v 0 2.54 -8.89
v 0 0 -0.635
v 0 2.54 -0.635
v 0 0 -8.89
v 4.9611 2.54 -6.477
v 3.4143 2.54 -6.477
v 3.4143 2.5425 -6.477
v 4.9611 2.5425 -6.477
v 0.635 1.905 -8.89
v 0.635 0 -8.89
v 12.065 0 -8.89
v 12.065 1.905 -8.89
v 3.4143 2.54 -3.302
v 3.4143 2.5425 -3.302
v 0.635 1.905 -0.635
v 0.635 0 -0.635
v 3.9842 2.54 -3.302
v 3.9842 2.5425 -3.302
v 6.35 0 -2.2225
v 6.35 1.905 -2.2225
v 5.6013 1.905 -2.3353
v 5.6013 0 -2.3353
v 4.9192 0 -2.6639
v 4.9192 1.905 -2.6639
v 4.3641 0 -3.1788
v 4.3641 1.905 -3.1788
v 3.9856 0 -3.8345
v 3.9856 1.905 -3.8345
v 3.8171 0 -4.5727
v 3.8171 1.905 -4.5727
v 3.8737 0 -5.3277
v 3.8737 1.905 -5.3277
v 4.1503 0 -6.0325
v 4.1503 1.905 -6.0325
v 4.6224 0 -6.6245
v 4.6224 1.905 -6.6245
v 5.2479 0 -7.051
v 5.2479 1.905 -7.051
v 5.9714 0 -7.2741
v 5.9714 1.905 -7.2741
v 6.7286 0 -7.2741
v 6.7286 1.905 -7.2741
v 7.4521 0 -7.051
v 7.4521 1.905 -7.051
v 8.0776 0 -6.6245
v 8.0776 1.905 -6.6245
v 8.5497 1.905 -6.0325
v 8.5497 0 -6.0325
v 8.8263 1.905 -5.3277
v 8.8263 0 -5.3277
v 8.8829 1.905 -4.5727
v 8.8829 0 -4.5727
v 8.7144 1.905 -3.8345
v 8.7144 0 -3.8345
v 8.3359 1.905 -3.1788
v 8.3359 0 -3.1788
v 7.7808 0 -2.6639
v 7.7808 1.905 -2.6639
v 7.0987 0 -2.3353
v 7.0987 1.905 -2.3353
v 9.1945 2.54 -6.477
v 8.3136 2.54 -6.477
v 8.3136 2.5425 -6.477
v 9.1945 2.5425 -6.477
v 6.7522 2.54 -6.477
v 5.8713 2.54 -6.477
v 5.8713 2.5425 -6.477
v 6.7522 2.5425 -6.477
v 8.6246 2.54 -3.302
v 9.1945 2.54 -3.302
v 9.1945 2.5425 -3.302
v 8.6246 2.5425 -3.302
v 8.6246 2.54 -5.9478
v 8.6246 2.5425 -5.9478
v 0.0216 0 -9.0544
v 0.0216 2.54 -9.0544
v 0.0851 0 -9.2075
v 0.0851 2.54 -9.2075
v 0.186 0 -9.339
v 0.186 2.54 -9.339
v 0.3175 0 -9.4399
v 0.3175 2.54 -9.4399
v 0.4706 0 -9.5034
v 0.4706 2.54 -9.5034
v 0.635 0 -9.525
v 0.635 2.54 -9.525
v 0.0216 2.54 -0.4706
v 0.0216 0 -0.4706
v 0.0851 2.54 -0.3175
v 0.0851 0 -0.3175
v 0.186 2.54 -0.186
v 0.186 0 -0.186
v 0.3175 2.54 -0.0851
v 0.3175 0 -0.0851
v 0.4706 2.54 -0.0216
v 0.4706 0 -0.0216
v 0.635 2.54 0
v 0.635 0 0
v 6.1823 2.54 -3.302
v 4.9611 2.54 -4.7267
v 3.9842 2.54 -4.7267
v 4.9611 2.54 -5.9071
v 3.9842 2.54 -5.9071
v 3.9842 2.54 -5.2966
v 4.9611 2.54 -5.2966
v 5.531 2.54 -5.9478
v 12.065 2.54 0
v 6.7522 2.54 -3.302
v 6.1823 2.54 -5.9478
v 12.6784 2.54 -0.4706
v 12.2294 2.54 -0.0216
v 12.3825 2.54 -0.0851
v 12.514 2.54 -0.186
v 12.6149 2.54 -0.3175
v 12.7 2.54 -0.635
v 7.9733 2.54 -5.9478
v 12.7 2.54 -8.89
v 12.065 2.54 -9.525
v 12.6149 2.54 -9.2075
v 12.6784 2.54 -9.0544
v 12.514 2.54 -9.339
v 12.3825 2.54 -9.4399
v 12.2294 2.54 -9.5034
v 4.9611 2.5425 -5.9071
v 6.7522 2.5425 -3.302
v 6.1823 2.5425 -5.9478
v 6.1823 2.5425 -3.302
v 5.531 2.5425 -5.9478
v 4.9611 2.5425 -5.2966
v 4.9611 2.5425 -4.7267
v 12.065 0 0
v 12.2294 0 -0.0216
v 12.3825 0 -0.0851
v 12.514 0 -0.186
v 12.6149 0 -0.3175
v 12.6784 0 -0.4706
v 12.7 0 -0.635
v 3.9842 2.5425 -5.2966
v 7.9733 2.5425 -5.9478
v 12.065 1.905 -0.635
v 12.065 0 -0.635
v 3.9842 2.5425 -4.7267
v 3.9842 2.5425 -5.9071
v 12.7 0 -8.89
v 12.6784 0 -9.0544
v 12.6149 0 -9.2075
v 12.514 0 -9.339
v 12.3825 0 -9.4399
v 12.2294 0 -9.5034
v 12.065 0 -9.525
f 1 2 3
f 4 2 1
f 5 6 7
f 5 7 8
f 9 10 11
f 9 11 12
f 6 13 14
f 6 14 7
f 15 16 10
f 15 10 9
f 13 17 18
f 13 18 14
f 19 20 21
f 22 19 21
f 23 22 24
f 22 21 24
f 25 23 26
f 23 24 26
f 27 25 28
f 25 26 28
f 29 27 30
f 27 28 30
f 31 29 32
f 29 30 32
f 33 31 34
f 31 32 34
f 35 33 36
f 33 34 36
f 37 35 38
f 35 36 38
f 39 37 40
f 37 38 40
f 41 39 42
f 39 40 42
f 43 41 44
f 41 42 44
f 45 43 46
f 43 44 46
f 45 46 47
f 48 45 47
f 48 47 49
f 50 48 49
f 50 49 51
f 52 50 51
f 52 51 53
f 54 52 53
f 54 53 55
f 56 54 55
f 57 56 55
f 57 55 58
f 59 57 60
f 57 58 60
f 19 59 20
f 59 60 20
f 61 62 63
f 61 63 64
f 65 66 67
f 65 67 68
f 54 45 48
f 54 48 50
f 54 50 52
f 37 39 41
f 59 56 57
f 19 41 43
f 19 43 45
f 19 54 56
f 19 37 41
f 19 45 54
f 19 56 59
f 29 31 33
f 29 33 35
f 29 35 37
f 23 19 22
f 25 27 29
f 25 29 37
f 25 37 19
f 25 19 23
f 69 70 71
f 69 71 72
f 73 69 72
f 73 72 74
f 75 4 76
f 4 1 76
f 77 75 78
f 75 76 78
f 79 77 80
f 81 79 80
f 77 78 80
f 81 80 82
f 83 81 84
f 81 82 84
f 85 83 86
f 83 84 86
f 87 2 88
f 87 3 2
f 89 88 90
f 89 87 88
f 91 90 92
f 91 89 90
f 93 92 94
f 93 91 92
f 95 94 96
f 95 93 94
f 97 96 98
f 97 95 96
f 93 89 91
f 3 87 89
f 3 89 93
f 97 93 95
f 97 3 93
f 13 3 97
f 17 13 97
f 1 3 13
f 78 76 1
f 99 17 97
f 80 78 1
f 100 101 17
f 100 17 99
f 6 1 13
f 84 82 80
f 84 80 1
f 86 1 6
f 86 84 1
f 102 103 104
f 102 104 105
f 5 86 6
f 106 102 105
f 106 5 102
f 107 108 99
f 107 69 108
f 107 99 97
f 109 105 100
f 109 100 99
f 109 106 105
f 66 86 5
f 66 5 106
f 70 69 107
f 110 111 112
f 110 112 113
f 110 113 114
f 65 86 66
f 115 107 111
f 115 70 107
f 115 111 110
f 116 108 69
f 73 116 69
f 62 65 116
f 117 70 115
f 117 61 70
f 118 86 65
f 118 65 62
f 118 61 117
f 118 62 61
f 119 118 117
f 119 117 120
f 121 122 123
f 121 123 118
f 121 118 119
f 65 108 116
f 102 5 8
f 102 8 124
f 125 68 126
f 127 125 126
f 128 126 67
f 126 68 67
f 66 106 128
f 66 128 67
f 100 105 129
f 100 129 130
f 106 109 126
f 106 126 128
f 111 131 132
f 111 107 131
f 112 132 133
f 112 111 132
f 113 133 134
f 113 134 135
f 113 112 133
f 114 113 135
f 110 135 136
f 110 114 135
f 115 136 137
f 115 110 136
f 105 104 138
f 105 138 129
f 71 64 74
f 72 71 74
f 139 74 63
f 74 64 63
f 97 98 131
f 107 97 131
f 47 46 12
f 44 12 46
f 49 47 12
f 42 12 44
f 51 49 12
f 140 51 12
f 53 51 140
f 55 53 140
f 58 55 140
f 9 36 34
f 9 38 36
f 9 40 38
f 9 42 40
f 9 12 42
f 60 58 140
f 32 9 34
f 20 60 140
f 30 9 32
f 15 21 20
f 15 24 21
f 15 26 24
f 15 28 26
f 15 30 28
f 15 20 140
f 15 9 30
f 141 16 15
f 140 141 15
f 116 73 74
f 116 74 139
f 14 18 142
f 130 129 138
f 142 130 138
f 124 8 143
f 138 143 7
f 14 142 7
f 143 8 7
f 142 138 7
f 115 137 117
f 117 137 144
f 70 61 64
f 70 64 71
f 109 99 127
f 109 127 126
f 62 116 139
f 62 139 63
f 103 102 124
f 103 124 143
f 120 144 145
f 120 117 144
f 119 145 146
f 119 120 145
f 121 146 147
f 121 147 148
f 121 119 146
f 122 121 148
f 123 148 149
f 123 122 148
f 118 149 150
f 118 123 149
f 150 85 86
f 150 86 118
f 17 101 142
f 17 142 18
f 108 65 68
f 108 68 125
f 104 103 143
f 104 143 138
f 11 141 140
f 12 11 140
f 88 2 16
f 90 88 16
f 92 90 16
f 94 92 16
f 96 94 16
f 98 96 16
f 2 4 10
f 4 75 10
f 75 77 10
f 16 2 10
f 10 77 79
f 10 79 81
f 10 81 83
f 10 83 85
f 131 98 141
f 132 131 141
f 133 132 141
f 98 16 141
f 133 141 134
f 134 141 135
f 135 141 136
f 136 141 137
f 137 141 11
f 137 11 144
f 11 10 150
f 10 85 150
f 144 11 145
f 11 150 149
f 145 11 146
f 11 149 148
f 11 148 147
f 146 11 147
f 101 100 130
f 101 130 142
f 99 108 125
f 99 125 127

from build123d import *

# Parameters (mm, degrees)
SKETCH1_W           = 12.7
SKETCH1_H           = 9.525
BOSS_EXTRUDE1_DEPTH = 2.54
FILLET1_R           = 0.635
SHELL1_START        = 0.635
SHELL1_OUTLINE_W    = 1.905
SHELL1_OUTLINE_H    = 8.255
SHELL1_DEPTH        = 11.43
SKETCH2_R           = 2.54
BOSS_EXTRUDE2_DEPTH = 1.905
BOSS_EXTRUDE3_DEPTH = 0.00254


# Read off the part's stored shape, not the designer's step: Shell1
with BuildPart() as part:
    # Sketch1 → Boss-Extrude1 (new body)
    with BuildSketch(Plane(origin=(0, 0, 0), x_dir=(1, 0, 0), z_dir=(0, 1, 0))):
        with Locations((6.35, 4.7625)):
            Rectangle(SKETCH1_W, SKETCH1_H)
    extrude(amount=BOSS_EXTRUDE1_DEPTH)

    # Fillet1
    fillet1_edges = [part.edges().sort_by_distance(p)[0] for p in [
        (0, 1.27, -9.525),
        (12.7, 1.27, -9.525),
        (12.7, 1.27, 0),
        (0, 1.27, 0),
    ]]
    fillet(fillet1_edges, radius=FILLET1_R)

    # Shell1 outline → Shell1 (cut)
    with BuildSketch(Plane.YZ.offset(SHELL1_START)):
        with Locations((0.9525, -4.7625)):
            Rectangle(SHELL1_OUTLINE_W, SHELL1_OUTLINE_H)
    extrude(amount=SHELL1_DEPTH, mode=Mode.SUBTRACT)

    # Sketch2 → Boss-Extrude2 (add)
    with BuildSketch(Plane(origin=(0, 1.905, 0), x_dir=(-1, 0, 0), z_dir=(0, -1, 0))):
        with Locations(Location((-6.35, 4.7625, 0), (0, 0, 270))):
            Circle(SKETCH2_R)
    extrude(amount=BOSS_EXTRUDE2_DEPTH)

    # Sketch3 → Boss-Extrude3 (add)
    with BuildSketch(Plane(origin=(0, 2.54, 0), x_dir=(1, 0, 0), z_dir=(0, 1, 0))):
        Polygon((3.414346154, 6.477), (4.961141026, 6.477), (4.961141026, 5.907128205), (3.984217949, 5.907128205), (3.984217949, 5.296551282), (4.961141026, 5.296551282), (4.961141026, 4.726679487), (3.984217949, 4.726679487), (3.984217949, 3.302), (3.414346154, 3.302), align=None)
        Polygon((5.871282252, 6.477), (6.752166667, 6.477), (6.752166667, 3.302), (6.182294872, 3.302), (6.182294872, 5.947833333), (5.531012821, 5.947833333), align=None)
        Polygon((8.313589944, 6.477), (9.194474359, 6.477), (9.194474359, 3.302), (8.624602564, 3.302), (8.624602564, 5.947833333), (7.973320513, 5.947833333), align=None)
    extrude(amount=BOSS_EXTRUDE3_DEPTH)


solid = part.part
